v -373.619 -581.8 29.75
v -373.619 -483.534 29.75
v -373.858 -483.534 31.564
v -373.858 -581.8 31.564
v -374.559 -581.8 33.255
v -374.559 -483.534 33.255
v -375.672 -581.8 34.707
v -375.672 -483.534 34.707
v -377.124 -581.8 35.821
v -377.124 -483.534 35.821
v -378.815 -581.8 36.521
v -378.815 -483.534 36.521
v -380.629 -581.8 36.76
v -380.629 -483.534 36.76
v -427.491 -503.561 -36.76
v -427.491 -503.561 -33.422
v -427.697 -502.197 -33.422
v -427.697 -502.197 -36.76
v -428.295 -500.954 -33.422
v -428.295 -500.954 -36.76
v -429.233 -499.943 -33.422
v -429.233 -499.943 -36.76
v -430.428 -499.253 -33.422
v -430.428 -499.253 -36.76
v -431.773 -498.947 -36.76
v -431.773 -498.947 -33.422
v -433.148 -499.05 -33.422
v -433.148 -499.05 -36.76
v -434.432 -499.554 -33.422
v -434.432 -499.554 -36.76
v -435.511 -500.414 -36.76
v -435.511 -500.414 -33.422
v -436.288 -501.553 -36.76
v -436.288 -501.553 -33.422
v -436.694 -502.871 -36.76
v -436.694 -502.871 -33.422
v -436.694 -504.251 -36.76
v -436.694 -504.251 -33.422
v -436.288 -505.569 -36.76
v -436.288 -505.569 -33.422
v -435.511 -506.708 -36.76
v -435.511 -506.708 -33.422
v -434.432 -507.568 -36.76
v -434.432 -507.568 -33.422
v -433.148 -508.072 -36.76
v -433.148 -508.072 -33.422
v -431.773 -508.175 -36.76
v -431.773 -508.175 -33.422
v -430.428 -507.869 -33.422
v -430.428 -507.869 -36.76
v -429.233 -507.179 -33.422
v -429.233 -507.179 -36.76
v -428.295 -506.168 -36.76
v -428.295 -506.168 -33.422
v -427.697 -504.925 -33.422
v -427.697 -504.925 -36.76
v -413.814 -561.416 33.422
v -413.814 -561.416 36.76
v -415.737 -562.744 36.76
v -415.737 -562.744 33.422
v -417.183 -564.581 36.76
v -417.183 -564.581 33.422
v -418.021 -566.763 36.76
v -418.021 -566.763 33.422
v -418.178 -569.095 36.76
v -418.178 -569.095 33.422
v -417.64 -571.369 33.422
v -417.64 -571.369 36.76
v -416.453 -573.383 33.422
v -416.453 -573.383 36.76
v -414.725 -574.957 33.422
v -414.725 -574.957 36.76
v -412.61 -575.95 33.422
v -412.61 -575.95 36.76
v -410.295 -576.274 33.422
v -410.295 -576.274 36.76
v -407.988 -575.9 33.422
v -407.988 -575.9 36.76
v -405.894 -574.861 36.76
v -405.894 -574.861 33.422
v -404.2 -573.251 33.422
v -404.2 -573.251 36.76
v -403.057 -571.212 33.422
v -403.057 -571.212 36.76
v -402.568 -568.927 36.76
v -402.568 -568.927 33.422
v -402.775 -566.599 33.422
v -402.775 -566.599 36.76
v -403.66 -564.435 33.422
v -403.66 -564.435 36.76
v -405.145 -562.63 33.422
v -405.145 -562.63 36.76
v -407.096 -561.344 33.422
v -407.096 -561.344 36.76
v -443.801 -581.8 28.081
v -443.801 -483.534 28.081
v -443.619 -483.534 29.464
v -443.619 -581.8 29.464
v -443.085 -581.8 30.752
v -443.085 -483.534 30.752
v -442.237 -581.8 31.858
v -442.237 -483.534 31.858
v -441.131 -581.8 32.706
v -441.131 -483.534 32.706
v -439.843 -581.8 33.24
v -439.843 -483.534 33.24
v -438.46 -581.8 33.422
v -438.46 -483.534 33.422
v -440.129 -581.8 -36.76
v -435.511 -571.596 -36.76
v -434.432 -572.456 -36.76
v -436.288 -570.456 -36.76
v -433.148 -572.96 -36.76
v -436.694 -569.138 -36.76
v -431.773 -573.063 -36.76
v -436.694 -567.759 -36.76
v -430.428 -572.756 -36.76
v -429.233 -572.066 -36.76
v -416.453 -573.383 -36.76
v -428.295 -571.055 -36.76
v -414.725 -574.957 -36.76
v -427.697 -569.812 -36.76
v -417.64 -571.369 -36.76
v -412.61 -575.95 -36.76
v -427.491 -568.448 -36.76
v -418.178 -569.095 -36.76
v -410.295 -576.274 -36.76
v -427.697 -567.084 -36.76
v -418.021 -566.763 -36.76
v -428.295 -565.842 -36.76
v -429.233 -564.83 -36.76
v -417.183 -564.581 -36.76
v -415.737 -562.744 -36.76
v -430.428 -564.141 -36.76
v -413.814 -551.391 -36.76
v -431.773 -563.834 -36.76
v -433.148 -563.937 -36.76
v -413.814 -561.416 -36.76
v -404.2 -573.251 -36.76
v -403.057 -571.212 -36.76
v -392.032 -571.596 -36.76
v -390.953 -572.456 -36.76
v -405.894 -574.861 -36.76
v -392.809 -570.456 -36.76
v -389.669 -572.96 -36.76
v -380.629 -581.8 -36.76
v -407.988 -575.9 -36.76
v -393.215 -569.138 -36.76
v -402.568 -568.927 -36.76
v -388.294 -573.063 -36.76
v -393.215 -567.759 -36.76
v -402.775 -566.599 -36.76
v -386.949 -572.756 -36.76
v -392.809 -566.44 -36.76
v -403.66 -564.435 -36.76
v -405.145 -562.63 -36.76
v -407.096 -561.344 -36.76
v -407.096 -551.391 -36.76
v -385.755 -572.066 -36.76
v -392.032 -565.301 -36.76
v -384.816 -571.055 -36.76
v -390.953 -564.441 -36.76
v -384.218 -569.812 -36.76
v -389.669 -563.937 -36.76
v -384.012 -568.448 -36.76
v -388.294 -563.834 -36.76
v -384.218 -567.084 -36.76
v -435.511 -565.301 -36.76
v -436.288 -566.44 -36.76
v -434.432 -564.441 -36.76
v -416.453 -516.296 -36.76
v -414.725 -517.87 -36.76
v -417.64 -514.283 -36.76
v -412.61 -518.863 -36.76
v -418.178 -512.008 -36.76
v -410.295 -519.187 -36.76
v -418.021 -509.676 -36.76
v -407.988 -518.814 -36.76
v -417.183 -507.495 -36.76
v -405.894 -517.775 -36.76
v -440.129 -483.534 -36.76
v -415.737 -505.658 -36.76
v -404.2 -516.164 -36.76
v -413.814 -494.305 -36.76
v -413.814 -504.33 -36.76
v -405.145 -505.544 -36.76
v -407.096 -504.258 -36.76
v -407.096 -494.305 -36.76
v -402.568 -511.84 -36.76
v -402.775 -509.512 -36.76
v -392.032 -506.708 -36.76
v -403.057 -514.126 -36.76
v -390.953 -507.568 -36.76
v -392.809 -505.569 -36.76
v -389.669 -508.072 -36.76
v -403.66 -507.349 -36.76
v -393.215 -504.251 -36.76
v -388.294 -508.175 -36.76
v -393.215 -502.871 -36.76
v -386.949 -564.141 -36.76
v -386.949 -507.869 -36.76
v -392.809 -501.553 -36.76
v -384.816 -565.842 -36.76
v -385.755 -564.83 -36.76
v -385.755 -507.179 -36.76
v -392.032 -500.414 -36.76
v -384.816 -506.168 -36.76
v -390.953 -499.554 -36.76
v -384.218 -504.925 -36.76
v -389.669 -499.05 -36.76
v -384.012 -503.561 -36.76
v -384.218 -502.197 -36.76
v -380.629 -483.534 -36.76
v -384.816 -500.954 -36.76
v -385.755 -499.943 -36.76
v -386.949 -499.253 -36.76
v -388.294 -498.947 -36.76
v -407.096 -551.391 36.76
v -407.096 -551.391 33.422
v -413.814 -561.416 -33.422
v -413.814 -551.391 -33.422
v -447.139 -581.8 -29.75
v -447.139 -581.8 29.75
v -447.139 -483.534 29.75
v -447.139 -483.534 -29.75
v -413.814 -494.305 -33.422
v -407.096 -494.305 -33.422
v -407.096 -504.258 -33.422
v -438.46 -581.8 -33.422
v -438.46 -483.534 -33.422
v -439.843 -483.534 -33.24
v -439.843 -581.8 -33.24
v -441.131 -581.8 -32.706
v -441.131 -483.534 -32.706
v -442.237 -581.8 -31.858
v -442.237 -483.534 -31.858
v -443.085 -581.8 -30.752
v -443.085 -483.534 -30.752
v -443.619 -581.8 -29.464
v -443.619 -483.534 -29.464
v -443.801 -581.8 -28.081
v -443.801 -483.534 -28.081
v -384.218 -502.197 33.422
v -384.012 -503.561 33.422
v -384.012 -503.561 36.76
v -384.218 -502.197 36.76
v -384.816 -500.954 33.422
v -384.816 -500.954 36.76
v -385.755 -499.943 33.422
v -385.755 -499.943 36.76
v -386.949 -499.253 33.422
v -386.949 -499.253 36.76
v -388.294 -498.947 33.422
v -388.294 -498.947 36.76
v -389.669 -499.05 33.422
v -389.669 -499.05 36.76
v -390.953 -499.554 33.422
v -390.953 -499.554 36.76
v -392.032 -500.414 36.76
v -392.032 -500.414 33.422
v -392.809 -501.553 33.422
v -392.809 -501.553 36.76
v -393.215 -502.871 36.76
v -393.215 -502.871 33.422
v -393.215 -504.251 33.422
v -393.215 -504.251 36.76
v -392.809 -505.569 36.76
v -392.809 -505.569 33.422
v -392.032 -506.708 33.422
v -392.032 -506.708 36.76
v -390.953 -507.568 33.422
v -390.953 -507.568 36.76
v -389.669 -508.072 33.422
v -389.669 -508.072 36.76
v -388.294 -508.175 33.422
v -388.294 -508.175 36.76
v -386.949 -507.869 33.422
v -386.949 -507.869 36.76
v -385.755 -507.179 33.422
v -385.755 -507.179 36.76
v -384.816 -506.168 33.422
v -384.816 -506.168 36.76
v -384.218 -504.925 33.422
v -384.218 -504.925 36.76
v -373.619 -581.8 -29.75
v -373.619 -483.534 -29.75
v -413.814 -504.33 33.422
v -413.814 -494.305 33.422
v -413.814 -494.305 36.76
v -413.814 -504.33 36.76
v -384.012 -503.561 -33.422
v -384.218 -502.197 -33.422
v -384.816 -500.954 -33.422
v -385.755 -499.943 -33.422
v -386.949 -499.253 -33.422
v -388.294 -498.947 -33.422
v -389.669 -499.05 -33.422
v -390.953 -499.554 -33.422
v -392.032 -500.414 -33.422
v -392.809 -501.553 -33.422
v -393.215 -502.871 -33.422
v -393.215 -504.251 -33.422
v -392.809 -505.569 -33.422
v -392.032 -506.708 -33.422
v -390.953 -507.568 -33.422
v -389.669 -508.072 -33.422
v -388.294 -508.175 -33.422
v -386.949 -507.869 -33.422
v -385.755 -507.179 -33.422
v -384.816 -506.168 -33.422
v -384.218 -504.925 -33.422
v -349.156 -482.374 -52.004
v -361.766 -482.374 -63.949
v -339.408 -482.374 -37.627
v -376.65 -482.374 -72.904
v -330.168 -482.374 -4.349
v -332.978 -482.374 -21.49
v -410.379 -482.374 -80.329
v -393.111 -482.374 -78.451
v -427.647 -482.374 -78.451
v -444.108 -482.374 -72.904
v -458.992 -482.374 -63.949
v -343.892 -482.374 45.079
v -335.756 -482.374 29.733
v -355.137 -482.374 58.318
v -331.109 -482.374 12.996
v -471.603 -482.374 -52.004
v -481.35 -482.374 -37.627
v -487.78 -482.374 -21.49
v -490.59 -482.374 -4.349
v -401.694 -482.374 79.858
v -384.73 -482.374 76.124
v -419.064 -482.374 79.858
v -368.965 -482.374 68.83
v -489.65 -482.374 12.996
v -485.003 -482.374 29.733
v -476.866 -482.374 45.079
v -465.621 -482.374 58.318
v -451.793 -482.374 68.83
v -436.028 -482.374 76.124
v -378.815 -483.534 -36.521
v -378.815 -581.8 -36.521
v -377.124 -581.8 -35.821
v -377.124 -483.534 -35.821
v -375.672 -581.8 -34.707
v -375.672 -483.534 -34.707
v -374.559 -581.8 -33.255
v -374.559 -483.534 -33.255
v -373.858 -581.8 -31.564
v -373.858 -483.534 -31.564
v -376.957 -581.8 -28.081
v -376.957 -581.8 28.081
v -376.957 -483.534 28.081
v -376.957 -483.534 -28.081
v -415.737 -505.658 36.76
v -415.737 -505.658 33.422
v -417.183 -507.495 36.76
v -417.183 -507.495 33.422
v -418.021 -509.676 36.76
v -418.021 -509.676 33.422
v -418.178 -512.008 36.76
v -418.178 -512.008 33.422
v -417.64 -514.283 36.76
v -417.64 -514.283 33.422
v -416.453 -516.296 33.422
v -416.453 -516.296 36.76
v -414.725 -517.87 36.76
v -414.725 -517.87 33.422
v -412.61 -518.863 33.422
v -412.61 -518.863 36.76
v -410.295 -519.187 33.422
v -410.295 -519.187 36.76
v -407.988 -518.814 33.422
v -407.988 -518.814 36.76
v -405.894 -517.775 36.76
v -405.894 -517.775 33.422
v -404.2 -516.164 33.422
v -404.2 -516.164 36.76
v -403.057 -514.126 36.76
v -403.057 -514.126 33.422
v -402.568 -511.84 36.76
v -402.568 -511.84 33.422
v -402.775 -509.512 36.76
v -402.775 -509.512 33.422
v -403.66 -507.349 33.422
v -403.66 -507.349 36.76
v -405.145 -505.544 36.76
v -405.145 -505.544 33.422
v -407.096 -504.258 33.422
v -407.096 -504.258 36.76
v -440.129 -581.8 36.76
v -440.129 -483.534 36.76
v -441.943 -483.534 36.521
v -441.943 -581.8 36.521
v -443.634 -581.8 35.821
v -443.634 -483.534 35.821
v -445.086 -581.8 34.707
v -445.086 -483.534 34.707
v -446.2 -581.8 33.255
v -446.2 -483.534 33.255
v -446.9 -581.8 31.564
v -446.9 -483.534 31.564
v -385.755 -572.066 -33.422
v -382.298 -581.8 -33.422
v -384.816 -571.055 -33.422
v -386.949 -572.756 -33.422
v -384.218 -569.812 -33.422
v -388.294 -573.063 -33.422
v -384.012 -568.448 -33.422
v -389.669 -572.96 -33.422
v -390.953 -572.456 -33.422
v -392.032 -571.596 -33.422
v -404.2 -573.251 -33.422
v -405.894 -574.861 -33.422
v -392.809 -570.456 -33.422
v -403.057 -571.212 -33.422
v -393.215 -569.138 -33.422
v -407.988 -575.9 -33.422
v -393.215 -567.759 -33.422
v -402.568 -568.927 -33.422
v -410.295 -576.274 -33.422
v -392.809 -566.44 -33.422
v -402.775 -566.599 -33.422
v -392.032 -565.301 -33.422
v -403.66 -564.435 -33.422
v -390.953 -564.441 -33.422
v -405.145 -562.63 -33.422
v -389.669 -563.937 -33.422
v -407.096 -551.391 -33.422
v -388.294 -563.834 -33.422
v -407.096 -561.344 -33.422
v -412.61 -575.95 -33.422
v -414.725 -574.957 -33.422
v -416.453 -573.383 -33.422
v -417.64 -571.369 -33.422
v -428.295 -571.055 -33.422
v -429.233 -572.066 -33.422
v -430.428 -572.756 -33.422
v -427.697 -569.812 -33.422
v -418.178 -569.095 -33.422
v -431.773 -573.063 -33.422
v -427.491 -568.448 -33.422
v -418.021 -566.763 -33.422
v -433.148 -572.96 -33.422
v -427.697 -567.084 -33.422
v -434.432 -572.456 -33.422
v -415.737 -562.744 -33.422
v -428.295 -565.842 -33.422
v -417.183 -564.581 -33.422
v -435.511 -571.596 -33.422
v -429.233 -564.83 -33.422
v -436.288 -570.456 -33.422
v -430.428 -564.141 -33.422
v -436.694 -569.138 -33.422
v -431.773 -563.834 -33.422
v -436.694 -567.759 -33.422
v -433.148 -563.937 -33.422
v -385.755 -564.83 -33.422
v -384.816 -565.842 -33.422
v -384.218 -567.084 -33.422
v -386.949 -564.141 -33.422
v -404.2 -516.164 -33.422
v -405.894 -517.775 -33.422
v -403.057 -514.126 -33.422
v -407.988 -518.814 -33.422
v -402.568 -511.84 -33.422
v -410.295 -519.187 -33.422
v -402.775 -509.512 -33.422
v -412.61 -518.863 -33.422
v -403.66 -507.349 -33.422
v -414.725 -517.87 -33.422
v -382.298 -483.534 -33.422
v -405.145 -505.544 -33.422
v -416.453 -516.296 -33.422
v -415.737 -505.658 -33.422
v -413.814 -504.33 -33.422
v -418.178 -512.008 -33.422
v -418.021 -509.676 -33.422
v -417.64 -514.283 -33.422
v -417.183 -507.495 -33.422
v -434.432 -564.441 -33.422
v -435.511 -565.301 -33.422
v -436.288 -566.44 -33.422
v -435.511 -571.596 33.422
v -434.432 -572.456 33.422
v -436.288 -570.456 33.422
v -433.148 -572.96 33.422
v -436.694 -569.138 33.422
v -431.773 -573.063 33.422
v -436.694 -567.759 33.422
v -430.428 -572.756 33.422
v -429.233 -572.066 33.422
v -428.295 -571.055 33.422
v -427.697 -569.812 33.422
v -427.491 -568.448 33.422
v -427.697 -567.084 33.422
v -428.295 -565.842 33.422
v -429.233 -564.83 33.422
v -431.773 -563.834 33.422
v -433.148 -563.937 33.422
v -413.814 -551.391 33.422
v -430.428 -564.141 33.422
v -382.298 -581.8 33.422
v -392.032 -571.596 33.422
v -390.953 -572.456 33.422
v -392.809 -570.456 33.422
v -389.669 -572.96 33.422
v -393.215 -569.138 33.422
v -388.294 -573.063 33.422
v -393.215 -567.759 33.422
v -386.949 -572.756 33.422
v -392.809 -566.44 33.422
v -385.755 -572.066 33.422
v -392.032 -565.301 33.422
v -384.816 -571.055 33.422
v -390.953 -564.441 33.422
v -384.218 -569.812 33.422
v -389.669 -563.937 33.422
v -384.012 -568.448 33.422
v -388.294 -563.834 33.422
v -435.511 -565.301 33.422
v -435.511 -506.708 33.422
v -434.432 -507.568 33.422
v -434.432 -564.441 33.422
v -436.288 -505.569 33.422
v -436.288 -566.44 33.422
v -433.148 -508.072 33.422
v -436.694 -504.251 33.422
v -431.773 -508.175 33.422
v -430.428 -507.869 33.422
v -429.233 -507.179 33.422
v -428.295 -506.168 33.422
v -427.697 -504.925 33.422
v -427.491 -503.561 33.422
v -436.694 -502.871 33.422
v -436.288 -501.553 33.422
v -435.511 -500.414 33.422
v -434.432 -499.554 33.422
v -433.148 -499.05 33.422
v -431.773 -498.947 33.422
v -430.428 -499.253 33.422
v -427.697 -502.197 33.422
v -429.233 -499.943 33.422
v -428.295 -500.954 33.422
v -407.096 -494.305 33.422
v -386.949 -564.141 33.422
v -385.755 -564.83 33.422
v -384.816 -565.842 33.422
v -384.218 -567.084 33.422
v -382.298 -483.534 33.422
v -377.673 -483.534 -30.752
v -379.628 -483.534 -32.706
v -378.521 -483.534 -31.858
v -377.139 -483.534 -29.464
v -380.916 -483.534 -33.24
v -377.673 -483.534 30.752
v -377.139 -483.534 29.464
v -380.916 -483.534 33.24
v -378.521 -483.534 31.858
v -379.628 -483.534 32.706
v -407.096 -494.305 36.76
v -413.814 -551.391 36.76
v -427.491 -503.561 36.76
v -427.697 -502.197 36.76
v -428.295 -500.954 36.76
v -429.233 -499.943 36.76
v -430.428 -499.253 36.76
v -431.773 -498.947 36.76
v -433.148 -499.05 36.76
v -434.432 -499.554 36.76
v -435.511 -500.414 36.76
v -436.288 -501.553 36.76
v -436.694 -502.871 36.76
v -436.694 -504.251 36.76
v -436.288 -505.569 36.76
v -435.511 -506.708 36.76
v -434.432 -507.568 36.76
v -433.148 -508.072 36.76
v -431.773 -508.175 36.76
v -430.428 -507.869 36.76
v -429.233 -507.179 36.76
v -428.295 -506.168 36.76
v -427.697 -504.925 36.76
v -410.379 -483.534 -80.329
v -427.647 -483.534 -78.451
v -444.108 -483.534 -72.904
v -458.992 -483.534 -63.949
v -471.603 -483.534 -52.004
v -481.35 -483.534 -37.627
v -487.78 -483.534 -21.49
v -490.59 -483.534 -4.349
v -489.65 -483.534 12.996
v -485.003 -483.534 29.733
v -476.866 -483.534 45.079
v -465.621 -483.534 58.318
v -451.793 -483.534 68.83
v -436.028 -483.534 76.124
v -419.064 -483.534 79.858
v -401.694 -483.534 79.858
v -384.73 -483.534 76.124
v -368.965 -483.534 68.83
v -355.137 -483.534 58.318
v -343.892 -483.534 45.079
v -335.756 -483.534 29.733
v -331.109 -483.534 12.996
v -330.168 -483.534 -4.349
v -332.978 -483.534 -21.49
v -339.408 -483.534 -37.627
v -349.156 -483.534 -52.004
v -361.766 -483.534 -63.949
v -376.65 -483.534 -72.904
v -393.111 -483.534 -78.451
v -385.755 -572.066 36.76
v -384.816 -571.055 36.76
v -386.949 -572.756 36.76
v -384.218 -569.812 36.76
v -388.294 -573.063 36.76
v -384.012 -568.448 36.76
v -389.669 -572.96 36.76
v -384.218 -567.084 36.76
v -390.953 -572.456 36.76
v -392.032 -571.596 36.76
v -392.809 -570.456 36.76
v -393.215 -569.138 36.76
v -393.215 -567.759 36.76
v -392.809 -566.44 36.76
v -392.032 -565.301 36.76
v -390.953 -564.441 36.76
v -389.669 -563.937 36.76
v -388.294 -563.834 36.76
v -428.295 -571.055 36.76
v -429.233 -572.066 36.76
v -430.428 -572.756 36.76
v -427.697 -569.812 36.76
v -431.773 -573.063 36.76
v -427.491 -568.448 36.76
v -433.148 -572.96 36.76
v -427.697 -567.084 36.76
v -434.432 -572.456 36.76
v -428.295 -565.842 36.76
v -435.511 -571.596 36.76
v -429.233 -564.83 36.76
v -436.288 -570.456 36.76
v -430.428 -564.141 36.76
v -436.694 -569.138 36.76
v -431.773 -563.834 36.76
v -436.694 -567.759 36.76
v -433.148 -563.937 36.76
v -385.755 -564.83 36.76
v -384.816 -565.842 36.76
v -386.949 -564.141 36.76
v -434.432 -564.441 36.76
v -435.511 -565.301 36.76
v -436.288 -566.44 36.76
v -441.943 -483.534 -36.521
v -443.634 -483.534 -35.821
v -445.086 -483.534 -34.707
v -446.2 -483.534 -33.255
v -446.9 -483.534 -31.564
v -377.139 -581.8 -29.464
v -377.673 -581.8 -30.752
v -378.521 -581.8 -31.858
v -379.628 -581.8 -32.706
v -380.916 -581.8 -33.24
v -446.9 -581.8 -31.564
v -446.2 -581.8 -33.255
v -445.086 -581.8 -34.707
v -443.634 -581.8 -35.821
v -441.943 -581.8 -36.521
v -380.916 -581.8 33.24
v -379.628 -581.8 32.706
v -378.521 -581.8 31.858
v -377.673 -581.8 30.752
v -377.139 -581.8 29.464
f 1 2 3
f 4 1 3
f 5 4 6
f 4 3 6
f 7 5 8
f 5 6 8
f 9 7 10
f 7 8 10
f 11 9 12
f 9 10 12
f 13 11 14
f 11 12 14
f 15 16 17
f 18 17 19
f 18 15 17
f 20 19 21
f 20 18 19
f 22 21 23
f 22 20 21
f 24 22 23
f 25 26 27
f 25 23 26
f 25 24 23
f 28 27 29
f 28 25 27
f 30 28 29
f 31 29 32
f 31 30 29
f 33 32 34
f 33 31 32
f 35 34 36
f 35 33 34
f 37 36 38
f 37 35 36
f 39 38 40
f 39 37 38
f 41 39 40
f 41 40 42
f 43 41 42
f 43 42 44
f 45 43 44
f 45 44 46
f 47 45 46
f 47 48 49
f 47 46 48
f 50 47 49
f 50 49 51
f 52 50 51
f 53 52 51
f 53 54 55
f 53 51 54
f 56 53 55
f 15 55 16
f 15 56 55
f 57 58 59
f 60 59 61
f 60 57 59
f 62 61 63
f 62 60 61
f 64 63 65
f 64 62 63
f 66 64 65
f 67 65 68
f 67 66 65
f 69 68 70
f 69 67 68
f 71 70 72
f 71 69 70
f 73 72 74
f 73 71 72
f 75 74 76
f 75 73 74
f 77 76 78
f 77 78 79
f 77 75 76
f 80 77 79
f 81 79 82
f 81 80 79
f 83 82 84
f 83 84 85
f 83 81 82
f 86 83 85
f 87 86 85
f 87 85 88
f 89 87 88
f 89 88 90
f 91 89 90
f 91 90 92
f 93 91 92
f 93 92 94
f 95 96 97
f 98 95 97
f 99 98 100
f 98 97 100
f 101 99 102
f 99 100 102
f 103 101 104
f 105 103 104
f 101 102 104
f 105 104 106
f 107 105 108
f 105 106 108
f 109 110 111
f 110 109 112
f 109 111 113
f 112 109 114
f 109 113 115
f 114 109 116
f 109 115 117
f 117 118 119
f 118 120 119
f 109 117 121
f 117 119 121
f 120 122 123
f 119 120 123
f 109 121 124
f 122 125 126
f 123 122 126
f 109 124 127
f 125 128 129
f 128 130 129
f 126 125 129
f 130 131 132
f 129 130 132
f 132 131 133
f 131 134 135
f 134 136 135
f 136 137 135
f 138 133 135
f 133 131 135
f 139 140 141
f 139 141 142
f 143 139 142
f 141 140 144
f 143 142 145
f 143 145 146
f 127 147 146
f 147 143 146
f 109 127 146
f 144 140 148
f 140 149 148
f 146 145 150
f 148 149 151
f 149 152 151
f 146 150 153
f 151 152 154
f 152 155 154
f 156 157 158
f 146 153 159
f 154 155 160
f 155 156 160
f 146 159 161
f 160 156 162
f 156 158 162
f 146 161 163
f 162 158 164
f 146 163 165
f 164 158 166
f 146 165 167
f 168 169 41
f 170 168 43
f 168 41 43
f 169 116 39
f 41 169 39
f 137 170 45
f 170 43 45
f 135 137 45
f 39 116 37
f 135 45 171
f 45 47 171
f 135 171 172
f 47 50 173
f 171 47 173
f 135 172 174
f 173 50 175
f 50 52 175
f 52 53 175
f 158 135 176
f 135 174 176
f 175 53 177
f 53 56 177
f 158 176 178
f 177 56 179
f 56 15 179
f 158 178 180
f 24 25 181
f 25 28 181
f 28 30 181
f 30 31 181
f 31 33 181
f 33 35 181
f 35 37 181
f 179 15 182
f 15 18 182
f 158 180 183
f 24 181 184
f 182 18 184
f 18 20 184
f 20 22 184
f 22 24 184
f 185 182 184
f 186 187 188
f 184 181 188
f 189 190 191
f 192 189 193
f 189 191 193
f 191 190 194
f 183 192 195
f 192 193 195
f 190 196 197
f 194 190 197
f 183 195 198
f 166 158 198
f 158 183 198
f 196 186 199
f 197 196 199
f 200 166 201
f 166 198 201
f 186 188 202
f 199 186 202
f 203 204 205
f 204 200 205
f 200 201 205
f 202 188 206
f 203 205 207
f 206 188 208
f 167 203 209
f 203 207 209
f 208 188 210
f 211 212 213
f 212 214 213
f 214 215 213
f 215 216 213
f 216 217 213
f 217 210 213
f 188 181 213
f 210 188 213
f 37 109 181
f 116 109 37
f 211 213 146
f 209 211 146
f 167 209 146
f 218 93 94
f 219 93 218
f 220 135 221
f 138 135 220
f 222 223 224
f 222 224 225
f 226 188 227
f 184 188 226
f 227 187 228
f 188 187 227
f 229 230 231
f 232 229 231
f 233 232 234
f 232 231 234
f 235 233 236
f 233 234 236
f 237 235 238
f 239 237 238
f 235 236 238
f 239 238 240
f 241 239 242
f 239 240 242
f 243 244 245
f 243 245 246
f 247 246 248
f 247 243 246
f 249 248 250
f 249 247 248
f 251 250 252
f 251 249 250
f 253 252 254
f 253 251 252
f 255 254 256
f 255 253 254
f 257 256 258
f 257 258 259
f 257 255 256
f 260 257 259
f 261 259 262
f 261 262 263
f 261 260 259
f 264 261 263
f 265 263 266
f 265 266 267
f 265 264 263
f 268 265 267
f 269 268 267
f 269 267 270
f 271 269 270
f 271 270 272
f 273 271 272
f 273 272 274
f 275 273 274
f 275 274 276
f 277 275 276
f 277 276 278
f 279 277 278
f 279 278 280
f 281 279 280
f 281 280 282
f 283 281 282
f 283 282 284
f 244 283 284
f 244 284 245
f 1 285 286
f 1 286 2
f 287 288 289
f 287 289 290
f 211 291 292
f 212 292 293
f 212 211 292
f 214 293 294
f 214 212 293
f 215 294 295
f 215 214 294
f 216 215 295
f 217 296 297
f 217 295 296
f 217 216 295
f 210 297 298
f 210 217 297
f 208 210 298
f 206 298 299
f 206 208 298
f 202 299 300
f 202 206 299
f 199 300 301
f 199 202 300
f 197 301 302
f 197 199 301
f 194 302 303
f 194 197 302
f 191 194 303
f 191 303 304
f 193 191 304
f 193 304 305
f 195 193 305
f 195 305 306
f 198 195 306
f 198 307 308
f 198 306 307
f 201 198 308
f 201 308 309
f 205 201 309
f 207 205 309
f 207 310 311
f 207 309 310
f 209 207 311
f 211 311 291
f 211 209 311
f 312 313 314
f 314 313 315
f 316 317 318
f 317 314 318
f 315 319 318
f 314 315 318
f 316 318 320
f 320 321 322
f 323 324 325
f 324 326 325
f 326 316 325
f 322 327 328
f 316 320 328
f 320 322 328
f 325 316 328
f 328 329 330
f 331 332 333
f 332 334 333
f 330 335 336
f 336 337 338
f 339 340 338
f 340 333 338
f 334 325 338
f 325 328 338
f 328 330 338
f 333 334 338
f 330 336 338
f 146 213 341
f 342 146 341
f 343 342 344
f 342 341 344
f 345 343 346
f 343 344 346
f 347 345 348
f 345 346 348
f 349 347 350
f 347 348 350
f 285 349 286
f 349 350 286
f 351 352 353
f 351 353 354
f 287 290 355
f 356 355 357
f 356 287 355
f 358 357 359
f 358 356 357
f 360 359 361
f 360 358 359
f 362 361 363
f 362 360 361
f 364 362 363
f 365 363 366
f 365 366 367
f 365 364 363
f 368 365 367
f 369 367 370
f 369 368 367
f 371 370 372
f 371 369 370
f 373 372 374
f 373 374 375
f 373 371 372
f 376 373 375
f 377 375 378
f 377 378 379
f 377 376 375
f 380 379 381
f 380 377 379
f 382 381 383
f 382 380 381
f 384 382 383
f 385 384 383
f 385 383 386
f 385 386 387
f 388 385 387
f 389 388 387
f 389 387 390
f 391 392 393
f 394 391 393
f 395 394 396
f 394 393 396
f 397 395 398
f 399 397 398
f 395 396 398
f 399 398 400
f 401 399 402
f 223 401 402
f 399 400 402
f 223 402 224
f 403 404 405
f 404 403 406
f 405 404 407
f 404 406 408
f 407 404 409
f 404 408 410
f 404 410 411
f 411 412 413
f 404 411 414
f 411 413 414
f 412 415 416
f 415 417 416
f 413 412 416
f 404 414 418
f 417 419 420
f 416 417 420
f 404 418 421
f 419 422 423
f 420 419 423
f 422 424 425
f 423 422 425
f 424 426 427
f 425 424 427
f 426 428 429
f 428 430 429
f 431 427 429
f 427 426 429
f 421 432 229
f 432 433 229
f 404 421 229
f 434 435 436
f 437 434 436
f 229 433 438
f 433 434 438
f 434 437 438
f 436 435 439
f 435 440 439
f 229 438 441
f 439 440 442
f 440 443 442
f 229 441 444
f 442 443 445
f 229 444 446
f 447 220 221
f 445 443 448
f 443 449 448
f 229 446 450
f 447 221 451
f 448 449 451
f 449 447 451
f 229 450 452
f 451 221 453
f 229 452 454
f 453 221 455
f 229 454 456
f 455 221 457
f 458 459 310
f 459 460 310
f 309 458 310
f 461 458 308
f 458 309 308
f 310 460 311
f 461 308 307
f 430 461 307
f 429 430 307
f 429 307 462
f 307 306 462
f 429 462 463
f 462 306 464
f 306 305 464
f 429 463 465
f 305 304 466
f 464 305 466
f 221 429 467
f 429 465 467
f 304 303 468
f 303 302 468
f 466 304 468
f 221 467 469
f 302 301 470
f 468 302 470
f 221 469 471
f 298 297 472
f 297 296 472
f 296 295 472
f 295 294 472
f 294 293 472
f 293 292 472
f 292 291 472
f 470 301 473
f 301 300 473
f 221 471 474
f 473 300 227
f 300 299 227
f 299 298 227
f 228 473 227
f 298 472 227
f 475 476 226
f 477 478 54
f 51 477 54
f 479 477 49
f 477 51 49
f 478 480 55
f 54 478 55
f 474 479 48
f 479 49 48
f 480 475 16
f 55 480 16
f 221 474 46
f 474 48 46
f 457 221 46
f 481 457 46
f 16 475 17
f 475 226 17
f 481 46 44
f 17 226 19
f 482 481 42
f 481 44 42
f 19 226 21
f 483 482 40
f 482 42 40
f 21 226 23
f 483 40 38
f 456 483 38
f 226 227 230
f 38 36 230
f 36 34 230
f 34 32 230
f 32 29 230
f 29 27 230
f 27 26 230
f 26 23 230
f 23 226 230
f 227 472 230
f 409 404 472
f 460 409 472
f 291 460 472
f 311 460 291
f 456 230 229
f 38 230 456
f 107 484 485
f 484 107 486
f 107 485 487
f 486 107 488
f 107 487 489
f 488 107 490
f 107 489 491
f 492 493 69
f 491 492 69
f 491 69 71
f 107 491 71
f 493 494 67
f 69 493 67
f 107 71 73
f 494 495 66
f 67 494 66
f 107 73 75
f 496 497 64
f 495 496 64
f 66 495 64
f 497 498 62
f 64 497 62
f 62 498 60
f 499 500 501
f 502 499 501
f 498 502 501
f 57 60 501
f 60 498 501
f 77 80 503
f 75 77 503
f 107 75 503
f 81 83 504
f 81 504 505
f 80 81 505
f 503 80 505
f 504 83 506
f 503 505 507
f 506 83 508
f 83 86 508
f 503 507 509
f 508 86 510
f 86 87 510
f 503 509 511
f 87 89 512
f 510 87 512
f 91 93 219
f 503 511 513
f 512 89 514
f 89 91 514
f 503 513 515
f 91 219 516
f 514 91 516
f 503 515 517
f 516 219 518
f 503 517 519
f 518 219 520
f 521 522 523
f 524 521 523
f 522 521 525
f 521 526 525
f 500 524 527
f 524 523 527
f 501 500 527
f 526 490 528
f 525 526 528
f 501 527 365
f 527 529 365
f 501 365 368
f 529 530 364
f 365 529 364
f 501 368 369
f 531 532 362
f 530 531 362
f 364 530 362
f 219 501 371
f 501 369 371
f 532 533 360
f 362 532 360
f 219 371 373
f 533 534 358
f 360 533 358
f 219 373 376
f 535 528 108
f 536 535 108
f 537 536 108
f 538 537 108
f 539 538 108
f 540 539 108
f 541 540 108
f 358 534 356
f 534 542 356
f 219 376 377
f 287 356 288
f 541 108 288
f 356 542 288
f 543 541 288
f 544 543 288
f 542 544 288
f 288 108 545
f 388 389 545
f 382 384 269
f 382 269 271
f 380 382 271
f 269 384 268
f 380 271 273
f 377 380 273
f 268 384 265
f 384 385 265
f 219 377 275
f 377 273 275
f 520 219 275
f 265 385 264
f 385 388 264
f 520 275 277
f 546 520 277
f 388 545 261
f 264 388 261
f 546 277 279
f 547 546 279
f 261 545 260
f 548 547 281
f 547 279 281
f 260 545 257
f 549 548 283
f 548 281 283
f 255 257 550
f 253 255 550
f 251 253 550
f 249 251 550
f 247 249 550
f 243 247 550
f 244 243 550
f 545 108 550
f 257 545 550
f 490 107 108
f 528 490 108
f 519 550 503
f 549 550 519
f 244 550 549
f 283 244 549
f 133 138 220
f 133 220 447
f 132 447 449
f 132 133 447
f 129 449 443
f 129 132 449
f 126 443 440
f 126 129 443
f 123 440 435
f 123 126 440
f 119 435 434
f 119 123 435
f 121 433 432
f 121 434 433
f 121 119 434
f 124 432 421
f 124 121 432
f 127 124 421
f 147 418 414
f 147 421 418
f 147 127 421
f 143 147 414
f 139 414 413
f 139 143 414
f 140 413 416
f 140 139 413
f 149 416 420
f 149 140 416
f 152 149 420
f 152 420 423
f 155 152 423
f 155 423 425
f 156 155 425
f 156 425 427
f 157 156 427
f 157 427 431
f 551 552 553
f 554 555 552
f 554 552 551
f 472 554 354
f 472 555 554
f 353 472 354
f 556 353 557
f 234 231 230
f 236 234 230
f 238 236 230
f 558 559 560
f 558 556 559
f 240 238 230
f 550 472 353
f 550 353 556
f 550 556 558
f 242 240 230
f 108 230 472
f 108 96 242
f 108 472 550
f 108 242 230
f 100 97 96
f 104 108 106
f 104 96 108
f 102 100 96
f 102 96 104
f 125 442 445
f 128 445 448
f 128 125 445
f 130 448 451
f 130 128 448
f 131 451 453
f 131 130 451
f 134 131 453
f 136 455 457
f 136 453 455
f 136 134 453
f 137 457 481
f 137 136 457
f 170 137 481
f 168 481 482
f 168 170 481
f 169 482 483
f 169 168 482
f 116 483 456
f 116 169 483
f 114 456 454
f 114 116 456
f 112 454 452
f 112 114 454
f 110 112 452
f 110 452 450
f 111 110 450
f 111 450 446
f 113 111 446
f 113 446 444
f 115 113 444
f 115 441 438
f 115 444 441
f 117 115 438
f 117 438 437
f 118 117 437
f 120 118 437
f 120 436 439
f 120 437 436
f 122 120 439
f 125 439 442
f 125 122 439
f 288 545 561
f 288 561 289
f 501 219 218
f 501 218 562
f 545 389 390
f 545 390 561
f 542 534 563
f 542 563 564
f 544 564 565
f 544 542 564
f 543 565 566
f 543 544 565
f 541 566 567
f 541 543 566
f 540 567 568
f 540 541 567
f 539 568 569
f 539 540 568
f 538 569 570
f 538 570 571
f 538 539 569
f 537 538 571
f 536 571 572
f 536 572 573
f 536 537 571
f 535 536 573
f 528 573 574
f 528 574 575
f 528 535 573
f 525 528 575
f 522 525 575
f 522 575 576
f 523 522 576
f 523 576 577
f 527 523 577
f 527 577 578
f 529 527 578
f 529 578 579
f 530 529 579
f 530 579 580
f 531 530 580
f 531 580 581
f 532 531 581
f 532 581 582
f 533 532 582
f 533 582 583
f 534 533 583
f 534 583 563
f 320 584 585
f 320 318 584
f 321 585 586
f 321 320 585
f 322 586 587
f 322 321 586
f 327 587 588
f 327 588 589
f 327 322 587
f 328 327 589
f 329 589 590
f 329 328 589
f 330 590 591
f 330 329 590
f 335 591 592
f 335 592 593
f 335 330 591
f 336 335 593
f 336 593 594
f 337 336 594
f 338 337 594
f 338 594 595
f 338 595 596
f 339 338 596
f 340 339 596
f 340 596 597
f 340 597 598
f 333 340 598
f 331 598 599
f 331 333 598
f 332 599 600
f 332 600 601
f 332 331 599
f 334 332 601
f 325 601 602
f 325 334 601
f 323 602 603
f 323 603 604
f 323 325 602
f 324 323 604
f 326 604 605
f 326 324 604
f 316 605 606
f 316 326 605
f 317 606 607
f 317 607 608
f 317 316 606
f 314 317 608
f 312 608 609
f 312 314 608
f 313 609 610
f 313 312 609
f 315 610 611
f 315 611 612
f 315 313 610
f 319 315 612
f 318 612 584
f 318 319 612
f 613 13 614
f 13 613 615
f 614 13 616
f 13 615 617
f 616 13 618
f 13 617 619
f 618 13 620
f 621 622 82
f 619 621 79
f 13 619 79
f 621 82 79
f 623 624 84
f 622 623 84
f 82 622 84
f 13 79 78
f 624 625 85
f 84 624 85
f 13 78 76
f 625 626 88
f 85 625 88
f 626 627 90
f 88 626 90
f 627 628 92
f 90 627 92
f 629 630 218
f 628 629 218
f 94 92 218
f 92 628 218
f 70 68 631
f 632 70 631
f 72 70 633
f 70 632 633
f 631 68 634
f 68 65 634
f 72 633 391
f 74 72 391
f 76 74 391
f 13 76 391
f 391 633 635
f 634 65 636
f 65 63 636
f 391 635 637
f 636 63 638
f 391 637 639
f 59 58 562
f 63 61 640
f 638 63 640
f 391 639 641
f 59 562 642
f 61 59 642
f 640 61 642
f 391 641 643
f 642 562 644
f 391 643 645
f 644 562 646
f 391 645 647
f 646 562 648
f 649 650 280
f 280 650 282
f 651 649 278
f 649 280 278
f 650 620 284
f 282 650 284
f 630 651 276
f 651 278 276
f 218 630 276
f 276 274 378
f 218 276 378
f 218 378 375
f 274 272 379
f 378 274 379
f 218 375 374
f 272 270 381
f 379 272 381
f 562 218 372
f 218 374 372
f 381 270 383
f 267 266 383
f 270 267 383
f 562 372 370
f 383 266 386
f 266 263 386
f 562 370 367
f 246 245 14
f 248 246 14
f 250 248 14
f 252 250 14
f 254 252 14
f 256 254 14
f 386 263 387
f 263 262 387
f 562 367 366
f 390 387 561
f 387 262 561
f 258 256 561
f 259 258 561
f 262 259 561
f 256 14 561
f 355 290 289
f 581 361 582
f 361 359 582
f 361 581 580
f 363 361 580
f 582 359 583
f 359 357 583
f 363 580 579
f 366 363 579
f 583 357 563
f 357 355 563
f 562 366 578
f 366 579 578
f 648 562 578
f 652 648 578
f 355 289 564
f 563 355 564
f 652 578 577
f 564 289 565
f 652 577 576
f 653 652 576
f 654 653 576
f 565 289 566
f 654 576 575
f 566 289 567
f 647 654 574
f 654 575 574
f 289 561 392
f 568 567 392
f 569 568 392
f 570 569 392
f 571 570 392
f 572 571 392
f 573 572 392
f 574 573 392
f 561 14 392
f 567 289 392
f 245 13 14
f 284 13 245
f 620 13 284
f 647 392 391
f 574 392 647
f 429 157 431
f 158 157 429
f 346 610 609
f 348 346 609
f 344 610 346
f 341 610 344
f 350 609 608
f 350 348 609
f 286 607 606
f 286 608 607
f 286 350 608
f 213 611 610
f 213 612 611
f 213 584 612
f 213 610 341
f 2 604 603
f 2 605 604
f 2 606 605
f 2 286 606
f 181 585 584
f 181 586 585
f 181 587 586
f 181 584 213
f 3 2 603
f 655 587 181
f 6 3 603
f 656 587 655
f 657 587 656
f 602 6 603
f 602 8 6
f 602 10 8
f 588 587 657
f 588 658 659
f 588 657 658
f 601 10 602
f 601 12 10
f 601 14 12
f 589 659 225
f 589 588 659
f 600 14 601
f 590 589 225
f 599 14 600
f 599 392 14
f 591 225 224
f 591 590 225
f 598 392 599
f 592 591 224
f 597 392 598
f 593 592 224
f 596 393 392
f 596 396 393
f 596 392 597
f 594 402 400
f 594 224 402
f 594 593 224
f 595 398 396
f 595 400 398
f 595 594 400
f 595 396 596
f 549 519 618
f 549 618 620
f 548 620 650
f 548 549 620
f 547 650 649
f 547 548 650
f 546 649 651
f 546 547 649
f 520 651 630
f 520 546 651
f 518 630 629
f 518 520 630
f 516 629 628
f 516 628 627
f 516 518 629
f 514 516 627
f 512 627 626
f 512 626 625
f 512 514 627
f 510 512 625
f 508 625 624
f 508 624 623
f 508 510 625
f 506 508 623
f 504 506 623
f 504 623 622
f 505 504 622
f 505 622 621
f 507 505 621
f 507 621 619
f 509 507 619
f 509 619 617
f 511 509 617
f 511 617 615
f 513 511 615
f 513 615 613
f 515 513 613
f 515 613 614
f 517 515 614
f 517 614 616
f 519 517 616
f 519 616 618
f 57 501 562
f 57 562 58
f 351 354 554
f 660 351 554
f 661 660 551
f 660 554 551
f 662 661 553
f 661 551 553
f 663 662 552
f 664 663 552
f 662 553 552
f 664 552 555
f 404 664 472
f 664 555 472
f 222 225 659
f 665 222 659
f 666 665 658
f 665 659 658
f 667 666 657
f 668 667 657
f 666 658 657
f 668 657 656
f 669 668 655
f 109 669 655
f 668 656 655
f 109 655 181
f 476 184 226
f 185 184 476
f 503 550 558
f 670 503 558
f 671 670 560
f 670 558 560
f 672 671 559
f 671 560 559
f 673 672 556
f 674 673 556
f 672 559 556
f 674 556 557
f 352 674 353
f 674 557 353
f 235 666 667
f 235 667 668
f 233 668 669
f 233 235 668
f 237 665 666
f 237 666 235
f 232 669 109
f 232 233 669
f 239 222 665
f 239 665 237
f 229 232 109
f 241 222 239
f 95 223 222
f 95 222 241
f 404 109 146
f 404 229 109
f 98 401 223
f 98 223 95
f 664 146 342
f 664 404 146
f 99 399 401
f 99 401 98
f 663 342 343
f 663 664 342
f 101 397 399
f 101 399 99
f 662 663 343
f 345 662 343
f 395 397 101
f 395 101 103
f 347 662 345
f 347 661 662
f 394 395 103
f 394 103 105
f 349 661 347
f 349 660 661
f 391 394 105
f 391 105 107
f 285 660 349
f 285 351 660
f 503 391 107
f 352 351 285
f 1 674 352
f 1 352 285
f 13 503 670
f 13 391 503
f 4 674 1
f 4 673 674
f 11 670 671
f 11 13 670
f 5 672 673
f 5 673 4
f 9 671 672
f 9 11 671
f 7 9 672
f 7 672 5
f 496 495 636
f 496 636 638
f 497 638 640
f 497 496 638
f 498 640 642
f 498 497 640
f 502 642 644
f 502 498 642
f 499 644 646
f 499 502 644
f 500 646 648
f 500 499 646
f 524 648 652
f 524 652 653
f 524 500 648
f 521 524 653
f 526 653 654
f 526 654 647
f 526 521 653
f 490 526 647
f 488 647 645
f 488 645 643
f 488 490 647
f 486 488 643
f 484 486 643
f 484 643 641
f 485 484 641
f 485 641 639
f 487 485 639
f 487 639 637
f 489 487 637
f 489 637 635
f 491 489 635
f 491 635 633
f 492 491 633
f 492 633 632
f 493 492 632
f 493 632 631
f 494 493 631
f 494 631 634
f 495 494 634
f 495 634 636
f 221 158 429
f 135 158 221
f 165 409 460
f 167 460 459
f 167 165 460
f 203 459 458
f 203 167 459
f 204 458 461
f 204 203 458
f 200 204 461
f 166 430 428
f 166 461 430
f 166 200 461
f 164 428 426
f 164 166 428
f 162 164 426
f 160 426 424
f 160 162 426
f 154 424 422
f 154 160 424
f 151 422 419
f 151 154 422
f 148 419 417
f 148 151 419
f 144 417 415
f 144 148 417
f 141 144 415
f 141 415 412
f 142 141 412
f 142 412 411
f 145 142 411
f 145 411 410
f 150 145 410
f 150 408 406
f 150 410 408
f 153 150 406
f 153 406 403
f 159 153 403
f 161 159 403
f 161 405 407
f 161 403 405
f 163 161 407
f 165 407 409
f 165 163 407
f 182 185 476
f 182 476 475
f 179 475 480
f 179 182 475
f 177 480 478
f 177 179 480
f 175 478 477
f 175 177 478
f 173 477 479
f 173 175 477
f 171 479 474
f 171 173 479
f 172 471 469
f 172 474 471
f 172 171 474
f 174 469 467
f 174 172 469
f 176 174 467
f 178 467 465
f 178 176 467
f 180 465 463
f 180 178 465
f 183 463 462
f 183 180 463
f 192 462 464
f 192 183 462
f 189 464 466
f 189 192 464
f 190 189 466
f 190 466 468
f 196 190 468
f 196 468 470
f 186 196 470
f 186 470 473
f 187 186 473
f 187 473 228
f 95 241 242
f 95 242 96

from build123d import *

# Parameters (mm, degrees)
SKETCH3_W               = 38.2050925
SKETCH3_H               = 0.551638054
BOSS_EXTRUDE1_DEPTH     = 46.736
CUT_EXTRUDE1_DEPTH      = 365.000734219
CUT_EXTRUDE1_DEPTH_BACK = 365.000734219
SKETCH5_R               = 2.200841193
SCALE1_SCALE            = 2.1025641


with BuildPart() as part:
    # Sketch3 → Revolve1 (revolve)
    with BuildSketch(Plane.XY):
        with Locations((-176.077749649, -229.697714421)):
            Rectangle(SKETCH3_W, SKETCH3_H)
    revolve(axis=Axis((-195.180295899, -229.973533448, 0), (0, 1, 0)))

    # Sketch4 → Boss-Extrude1 (add)
    with BuildSketch(Plane.XZ.offset(229.973533448)):
        with BuildLine():
            Line((-209.32977738, -17.483231481), (-181.030814417, -17.483231481))
            ThreePointArc((-181.030814417, -17.483231481), (-178.673497186, -16.506798713), (-177.697064417, -14.149481481))
            Line((-177.697064417, -14.149481481), (-177.697064417, 14.149481481))
            ThreePointArc((-177.697064417, 14.149481481), (-178.673497186, 16.506798713), (-181.030814417, 17.483231481))
            Line((-181.030814417, 17.483231481), (-209.32977738, 17.483231481))
            ThreePointArc((-209.32977738, 17.483231481), (-211.687094612, 16.506798713), (-212.66352738, 14.149481481))
            Line((-212.66352738, 14.149481481), (-212.66352738, -14.149481481))
            ThreePointArc((-212.66352738, -14.149481481), (-211.687094612, -16.506798713), (-209.32977738, -17.483231481))
        make_face()
        with BuildLine():
            Line((-211.07602738, -13.355731481), (-211.07602738, 13.355731481))
            ThreePointArc((-211.07602738, 13.355731481), (-210.332078604, 15.151782705), (-208.53602738, 15.895731481))
            Line((-208.53602738, 15.895731481), (-181.824564417, 15.895731481))
            ThreePointArc((-181.824564417, 15.895731481), (-180.028513193, 15.151782705), (-179.284564417, 13.355731481))
            Line((-179.284564417, 13.355731481), (-179.284564417, -13.355731481))
            ThreePointArc((-179.284564417, -13.355731481), (-180.028513193, -15.151782705), (-181.824564417, -15.895731481))
            Line((-181.824564417, -15.895731481), (-208.53602738, -15.895731481))
            ThreePointArc((-208.53602738, -15.895731481), (-210.332078604, -15.151782705), (-211.07602738, -13.355731481))
        make_face(mode=Mode.SUBTRACT)
    extrude(amount=BOSS_EXTRUDE1_DEPTH)

    # Sketch5 → Cut-Extrude1 (cut, two sides: drawn at the far end of the back side and taken through both)
    with BuildSketch(Plane.XY.offset(-CUT_EXTRUDE1_DEPTH_BACK)):
        with BuildLine():
            Line((-196.813996528, -262.2471497), (-196.813996528, -267.015063616))
            ThreePointArc((-196.813996528, -267.015063616), (-195.140241919, -274.081475398), (-193.618948859, -266.980679852))
            Line((-193.618948859, -266.980679852), (-193.618948859, -262.2471497))
            Line((-193.618948859, -262.2471497), (-196.813996528, -262.2471497))
        make_face()
        with BuildLine():
            Line((-196.813996528, -235.096274088), (-196.813996528, -239.864188004))
            ThreePointArc((-196.813996528, -239.864188004), (-195.140241919, -246.930599786), (-193.618948859, -239.82980424))
            Line((-193.618948859, -239.82980424), (-193.618948859, -235.096274088))
            Line((-193.618948859, -235.096274088), (-196.813996528, -235.096274088))
        make_face()
        with Locations((-205.51977738, -270.359533448)):
            Circle(SKETCH5_R)
        with Locations((-205.51977738, -239.498533448)):
            Circle(SKETCH5_R)
        with Locations((-184.840814417, -239.498533448)):
            Circle(SKETCH5_R)
        with Locations((-184.840814417, -270.359533448)):
            Circle(SKETCH5_R)
    extrude(amount=CUT_EXTRUDE1_DEPTH + CUT_EXTRUDE1_DEPTH_BACK, mode=Mode.SUBTRACT)


with BuildPart() as part_1:
    # Scale1: scaled about (0, 0, 0)
    add(part.part.scale(SCALE1_SCALE))


solid = part_1.part
